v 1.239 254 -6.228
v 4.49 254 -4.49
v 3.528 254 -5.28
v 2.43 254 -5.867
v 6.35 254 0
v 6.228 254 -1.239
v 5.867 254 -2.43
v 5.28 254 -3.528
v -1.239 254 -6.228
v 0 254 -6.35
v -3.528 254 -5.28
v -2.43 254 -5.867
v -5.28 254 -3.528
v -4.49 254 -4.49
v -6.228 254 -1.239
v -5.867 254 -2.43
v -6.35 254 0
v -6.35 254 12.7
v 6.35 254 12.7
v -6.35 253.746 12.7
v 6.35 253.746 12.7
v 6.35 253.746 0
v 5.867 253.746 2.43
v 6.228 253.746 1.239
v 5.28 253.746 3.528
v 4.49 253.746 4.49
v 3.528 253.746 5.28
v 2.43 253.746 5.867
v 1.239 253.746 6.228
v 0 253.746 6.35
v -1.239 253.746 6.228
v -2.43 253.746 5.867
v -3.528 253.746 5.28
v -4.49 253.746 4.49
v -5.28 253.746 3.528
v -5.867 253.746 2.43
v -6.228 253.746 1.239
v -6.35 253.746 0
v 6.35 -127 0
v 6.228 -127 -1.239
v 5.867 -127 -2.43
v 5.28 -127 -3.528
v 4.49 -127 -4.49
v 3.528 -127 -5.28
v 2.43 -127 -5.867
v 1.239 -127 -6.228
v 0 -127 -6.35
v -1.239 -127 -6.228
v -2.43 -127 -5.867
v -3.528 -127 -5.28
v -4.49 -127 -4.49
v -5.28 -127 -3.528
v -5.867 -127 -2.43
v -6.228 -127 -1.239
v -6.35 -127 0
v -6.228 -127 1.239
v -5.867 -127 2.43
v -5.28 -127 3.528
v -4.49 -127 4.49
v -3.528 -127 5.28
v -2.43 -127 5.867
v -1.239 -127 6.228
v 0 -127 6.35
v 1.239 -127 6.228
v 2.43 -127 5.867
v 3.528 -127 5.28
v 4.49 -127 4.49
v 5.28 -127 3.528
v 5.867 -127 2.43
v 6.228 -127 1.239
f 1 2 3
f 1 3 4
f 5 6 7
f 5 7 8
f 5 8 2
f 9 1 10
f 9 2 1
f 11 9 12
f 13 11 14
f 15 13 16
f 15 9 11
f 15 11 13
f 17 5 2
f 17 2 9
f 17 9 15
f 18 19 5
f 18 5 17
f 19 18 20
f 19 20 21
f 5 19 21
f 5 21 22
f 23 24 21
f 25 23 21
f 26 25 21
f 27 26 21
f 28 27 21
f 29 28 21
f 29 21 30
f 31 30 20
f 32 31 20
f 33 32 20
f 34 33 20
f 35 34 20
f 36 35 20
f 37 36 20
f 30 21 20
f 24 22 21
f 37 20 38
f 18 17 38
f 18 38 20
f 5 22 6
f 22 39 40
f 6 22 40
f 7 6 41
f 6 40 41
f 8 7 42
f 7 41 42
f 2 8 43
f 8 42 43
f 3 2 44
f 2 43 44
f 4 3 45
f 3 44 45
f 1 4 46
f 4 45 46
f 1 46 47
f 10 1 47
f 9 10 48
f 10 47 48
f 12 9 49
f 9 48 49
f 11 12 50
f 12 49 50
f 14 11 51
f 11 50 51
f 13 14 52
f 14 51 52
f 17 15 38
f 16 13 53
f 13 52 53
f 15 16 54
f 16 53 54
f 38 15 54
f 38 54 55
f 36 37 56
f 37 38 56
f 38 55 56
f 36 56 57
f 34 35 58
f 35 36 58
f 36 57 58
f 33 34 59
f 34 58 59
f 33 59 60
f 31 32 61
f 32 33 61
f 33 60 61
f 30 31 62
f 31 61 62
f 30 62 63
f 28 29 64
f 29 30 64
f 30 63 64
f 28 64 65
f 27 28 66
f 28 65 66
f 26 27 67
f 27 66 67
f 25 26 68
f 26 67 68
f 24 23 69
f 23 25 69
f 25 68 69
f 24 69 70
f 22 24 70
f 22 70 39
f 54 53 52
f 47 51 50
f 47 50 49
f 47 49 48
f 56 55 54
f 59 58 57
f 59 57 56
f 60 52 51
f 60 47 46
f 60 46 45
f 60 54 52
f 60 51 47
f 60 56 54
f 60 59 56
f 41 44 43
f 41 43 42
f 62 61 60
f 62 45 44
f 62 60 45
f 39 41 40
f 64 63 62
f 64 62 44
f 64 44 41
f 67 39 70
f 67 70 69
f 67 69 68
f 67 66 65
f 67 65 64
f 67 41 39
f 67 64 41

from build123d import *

# Parameters (mm, degrees)
F0_R      = 6.35
F1_DEPTH  = 127
F1_FACE_R = 6.35
F2_DEPTH  = 254
F4_DEPTH  = 0.254


with BuildPart() as f1:
    # F0 (on Front) → F1 (new body)
    with BuildSketch(Plane.XZ):
        Circle(F0_R)
    extrude(amount=F1_DEPTH)

    # F1_face (on face) → F2 (join)
    with BuildSketch(Plane(origin=(0, 0, 0), x_dir=(1, 0, 0), z_dir=(0, 1, 0))):
        Circle(F1_FACE_R)
    extrude(amount=F2_DEPTH)

    # F3 (on face) → F4 (join)
    with BuildSketch(Plane(origin=(0, 254, 0), x_dir=(-1, 0, 0), z_dir=(0, 1, 0))):
        with BuildLine():
            Line((6.35, 12.7), (-6.35, 12.7))
            Line((-6.35, 12.7), (-6.35, 0))
            ThreePointArc((-6.35, 0), (0, 6.35), (6.35, 0))
            Line((6.35, 0), (6.35, 12.7))
        make_face()
    extrude(amount=-F4_DEPTH)


solid = f1.part
